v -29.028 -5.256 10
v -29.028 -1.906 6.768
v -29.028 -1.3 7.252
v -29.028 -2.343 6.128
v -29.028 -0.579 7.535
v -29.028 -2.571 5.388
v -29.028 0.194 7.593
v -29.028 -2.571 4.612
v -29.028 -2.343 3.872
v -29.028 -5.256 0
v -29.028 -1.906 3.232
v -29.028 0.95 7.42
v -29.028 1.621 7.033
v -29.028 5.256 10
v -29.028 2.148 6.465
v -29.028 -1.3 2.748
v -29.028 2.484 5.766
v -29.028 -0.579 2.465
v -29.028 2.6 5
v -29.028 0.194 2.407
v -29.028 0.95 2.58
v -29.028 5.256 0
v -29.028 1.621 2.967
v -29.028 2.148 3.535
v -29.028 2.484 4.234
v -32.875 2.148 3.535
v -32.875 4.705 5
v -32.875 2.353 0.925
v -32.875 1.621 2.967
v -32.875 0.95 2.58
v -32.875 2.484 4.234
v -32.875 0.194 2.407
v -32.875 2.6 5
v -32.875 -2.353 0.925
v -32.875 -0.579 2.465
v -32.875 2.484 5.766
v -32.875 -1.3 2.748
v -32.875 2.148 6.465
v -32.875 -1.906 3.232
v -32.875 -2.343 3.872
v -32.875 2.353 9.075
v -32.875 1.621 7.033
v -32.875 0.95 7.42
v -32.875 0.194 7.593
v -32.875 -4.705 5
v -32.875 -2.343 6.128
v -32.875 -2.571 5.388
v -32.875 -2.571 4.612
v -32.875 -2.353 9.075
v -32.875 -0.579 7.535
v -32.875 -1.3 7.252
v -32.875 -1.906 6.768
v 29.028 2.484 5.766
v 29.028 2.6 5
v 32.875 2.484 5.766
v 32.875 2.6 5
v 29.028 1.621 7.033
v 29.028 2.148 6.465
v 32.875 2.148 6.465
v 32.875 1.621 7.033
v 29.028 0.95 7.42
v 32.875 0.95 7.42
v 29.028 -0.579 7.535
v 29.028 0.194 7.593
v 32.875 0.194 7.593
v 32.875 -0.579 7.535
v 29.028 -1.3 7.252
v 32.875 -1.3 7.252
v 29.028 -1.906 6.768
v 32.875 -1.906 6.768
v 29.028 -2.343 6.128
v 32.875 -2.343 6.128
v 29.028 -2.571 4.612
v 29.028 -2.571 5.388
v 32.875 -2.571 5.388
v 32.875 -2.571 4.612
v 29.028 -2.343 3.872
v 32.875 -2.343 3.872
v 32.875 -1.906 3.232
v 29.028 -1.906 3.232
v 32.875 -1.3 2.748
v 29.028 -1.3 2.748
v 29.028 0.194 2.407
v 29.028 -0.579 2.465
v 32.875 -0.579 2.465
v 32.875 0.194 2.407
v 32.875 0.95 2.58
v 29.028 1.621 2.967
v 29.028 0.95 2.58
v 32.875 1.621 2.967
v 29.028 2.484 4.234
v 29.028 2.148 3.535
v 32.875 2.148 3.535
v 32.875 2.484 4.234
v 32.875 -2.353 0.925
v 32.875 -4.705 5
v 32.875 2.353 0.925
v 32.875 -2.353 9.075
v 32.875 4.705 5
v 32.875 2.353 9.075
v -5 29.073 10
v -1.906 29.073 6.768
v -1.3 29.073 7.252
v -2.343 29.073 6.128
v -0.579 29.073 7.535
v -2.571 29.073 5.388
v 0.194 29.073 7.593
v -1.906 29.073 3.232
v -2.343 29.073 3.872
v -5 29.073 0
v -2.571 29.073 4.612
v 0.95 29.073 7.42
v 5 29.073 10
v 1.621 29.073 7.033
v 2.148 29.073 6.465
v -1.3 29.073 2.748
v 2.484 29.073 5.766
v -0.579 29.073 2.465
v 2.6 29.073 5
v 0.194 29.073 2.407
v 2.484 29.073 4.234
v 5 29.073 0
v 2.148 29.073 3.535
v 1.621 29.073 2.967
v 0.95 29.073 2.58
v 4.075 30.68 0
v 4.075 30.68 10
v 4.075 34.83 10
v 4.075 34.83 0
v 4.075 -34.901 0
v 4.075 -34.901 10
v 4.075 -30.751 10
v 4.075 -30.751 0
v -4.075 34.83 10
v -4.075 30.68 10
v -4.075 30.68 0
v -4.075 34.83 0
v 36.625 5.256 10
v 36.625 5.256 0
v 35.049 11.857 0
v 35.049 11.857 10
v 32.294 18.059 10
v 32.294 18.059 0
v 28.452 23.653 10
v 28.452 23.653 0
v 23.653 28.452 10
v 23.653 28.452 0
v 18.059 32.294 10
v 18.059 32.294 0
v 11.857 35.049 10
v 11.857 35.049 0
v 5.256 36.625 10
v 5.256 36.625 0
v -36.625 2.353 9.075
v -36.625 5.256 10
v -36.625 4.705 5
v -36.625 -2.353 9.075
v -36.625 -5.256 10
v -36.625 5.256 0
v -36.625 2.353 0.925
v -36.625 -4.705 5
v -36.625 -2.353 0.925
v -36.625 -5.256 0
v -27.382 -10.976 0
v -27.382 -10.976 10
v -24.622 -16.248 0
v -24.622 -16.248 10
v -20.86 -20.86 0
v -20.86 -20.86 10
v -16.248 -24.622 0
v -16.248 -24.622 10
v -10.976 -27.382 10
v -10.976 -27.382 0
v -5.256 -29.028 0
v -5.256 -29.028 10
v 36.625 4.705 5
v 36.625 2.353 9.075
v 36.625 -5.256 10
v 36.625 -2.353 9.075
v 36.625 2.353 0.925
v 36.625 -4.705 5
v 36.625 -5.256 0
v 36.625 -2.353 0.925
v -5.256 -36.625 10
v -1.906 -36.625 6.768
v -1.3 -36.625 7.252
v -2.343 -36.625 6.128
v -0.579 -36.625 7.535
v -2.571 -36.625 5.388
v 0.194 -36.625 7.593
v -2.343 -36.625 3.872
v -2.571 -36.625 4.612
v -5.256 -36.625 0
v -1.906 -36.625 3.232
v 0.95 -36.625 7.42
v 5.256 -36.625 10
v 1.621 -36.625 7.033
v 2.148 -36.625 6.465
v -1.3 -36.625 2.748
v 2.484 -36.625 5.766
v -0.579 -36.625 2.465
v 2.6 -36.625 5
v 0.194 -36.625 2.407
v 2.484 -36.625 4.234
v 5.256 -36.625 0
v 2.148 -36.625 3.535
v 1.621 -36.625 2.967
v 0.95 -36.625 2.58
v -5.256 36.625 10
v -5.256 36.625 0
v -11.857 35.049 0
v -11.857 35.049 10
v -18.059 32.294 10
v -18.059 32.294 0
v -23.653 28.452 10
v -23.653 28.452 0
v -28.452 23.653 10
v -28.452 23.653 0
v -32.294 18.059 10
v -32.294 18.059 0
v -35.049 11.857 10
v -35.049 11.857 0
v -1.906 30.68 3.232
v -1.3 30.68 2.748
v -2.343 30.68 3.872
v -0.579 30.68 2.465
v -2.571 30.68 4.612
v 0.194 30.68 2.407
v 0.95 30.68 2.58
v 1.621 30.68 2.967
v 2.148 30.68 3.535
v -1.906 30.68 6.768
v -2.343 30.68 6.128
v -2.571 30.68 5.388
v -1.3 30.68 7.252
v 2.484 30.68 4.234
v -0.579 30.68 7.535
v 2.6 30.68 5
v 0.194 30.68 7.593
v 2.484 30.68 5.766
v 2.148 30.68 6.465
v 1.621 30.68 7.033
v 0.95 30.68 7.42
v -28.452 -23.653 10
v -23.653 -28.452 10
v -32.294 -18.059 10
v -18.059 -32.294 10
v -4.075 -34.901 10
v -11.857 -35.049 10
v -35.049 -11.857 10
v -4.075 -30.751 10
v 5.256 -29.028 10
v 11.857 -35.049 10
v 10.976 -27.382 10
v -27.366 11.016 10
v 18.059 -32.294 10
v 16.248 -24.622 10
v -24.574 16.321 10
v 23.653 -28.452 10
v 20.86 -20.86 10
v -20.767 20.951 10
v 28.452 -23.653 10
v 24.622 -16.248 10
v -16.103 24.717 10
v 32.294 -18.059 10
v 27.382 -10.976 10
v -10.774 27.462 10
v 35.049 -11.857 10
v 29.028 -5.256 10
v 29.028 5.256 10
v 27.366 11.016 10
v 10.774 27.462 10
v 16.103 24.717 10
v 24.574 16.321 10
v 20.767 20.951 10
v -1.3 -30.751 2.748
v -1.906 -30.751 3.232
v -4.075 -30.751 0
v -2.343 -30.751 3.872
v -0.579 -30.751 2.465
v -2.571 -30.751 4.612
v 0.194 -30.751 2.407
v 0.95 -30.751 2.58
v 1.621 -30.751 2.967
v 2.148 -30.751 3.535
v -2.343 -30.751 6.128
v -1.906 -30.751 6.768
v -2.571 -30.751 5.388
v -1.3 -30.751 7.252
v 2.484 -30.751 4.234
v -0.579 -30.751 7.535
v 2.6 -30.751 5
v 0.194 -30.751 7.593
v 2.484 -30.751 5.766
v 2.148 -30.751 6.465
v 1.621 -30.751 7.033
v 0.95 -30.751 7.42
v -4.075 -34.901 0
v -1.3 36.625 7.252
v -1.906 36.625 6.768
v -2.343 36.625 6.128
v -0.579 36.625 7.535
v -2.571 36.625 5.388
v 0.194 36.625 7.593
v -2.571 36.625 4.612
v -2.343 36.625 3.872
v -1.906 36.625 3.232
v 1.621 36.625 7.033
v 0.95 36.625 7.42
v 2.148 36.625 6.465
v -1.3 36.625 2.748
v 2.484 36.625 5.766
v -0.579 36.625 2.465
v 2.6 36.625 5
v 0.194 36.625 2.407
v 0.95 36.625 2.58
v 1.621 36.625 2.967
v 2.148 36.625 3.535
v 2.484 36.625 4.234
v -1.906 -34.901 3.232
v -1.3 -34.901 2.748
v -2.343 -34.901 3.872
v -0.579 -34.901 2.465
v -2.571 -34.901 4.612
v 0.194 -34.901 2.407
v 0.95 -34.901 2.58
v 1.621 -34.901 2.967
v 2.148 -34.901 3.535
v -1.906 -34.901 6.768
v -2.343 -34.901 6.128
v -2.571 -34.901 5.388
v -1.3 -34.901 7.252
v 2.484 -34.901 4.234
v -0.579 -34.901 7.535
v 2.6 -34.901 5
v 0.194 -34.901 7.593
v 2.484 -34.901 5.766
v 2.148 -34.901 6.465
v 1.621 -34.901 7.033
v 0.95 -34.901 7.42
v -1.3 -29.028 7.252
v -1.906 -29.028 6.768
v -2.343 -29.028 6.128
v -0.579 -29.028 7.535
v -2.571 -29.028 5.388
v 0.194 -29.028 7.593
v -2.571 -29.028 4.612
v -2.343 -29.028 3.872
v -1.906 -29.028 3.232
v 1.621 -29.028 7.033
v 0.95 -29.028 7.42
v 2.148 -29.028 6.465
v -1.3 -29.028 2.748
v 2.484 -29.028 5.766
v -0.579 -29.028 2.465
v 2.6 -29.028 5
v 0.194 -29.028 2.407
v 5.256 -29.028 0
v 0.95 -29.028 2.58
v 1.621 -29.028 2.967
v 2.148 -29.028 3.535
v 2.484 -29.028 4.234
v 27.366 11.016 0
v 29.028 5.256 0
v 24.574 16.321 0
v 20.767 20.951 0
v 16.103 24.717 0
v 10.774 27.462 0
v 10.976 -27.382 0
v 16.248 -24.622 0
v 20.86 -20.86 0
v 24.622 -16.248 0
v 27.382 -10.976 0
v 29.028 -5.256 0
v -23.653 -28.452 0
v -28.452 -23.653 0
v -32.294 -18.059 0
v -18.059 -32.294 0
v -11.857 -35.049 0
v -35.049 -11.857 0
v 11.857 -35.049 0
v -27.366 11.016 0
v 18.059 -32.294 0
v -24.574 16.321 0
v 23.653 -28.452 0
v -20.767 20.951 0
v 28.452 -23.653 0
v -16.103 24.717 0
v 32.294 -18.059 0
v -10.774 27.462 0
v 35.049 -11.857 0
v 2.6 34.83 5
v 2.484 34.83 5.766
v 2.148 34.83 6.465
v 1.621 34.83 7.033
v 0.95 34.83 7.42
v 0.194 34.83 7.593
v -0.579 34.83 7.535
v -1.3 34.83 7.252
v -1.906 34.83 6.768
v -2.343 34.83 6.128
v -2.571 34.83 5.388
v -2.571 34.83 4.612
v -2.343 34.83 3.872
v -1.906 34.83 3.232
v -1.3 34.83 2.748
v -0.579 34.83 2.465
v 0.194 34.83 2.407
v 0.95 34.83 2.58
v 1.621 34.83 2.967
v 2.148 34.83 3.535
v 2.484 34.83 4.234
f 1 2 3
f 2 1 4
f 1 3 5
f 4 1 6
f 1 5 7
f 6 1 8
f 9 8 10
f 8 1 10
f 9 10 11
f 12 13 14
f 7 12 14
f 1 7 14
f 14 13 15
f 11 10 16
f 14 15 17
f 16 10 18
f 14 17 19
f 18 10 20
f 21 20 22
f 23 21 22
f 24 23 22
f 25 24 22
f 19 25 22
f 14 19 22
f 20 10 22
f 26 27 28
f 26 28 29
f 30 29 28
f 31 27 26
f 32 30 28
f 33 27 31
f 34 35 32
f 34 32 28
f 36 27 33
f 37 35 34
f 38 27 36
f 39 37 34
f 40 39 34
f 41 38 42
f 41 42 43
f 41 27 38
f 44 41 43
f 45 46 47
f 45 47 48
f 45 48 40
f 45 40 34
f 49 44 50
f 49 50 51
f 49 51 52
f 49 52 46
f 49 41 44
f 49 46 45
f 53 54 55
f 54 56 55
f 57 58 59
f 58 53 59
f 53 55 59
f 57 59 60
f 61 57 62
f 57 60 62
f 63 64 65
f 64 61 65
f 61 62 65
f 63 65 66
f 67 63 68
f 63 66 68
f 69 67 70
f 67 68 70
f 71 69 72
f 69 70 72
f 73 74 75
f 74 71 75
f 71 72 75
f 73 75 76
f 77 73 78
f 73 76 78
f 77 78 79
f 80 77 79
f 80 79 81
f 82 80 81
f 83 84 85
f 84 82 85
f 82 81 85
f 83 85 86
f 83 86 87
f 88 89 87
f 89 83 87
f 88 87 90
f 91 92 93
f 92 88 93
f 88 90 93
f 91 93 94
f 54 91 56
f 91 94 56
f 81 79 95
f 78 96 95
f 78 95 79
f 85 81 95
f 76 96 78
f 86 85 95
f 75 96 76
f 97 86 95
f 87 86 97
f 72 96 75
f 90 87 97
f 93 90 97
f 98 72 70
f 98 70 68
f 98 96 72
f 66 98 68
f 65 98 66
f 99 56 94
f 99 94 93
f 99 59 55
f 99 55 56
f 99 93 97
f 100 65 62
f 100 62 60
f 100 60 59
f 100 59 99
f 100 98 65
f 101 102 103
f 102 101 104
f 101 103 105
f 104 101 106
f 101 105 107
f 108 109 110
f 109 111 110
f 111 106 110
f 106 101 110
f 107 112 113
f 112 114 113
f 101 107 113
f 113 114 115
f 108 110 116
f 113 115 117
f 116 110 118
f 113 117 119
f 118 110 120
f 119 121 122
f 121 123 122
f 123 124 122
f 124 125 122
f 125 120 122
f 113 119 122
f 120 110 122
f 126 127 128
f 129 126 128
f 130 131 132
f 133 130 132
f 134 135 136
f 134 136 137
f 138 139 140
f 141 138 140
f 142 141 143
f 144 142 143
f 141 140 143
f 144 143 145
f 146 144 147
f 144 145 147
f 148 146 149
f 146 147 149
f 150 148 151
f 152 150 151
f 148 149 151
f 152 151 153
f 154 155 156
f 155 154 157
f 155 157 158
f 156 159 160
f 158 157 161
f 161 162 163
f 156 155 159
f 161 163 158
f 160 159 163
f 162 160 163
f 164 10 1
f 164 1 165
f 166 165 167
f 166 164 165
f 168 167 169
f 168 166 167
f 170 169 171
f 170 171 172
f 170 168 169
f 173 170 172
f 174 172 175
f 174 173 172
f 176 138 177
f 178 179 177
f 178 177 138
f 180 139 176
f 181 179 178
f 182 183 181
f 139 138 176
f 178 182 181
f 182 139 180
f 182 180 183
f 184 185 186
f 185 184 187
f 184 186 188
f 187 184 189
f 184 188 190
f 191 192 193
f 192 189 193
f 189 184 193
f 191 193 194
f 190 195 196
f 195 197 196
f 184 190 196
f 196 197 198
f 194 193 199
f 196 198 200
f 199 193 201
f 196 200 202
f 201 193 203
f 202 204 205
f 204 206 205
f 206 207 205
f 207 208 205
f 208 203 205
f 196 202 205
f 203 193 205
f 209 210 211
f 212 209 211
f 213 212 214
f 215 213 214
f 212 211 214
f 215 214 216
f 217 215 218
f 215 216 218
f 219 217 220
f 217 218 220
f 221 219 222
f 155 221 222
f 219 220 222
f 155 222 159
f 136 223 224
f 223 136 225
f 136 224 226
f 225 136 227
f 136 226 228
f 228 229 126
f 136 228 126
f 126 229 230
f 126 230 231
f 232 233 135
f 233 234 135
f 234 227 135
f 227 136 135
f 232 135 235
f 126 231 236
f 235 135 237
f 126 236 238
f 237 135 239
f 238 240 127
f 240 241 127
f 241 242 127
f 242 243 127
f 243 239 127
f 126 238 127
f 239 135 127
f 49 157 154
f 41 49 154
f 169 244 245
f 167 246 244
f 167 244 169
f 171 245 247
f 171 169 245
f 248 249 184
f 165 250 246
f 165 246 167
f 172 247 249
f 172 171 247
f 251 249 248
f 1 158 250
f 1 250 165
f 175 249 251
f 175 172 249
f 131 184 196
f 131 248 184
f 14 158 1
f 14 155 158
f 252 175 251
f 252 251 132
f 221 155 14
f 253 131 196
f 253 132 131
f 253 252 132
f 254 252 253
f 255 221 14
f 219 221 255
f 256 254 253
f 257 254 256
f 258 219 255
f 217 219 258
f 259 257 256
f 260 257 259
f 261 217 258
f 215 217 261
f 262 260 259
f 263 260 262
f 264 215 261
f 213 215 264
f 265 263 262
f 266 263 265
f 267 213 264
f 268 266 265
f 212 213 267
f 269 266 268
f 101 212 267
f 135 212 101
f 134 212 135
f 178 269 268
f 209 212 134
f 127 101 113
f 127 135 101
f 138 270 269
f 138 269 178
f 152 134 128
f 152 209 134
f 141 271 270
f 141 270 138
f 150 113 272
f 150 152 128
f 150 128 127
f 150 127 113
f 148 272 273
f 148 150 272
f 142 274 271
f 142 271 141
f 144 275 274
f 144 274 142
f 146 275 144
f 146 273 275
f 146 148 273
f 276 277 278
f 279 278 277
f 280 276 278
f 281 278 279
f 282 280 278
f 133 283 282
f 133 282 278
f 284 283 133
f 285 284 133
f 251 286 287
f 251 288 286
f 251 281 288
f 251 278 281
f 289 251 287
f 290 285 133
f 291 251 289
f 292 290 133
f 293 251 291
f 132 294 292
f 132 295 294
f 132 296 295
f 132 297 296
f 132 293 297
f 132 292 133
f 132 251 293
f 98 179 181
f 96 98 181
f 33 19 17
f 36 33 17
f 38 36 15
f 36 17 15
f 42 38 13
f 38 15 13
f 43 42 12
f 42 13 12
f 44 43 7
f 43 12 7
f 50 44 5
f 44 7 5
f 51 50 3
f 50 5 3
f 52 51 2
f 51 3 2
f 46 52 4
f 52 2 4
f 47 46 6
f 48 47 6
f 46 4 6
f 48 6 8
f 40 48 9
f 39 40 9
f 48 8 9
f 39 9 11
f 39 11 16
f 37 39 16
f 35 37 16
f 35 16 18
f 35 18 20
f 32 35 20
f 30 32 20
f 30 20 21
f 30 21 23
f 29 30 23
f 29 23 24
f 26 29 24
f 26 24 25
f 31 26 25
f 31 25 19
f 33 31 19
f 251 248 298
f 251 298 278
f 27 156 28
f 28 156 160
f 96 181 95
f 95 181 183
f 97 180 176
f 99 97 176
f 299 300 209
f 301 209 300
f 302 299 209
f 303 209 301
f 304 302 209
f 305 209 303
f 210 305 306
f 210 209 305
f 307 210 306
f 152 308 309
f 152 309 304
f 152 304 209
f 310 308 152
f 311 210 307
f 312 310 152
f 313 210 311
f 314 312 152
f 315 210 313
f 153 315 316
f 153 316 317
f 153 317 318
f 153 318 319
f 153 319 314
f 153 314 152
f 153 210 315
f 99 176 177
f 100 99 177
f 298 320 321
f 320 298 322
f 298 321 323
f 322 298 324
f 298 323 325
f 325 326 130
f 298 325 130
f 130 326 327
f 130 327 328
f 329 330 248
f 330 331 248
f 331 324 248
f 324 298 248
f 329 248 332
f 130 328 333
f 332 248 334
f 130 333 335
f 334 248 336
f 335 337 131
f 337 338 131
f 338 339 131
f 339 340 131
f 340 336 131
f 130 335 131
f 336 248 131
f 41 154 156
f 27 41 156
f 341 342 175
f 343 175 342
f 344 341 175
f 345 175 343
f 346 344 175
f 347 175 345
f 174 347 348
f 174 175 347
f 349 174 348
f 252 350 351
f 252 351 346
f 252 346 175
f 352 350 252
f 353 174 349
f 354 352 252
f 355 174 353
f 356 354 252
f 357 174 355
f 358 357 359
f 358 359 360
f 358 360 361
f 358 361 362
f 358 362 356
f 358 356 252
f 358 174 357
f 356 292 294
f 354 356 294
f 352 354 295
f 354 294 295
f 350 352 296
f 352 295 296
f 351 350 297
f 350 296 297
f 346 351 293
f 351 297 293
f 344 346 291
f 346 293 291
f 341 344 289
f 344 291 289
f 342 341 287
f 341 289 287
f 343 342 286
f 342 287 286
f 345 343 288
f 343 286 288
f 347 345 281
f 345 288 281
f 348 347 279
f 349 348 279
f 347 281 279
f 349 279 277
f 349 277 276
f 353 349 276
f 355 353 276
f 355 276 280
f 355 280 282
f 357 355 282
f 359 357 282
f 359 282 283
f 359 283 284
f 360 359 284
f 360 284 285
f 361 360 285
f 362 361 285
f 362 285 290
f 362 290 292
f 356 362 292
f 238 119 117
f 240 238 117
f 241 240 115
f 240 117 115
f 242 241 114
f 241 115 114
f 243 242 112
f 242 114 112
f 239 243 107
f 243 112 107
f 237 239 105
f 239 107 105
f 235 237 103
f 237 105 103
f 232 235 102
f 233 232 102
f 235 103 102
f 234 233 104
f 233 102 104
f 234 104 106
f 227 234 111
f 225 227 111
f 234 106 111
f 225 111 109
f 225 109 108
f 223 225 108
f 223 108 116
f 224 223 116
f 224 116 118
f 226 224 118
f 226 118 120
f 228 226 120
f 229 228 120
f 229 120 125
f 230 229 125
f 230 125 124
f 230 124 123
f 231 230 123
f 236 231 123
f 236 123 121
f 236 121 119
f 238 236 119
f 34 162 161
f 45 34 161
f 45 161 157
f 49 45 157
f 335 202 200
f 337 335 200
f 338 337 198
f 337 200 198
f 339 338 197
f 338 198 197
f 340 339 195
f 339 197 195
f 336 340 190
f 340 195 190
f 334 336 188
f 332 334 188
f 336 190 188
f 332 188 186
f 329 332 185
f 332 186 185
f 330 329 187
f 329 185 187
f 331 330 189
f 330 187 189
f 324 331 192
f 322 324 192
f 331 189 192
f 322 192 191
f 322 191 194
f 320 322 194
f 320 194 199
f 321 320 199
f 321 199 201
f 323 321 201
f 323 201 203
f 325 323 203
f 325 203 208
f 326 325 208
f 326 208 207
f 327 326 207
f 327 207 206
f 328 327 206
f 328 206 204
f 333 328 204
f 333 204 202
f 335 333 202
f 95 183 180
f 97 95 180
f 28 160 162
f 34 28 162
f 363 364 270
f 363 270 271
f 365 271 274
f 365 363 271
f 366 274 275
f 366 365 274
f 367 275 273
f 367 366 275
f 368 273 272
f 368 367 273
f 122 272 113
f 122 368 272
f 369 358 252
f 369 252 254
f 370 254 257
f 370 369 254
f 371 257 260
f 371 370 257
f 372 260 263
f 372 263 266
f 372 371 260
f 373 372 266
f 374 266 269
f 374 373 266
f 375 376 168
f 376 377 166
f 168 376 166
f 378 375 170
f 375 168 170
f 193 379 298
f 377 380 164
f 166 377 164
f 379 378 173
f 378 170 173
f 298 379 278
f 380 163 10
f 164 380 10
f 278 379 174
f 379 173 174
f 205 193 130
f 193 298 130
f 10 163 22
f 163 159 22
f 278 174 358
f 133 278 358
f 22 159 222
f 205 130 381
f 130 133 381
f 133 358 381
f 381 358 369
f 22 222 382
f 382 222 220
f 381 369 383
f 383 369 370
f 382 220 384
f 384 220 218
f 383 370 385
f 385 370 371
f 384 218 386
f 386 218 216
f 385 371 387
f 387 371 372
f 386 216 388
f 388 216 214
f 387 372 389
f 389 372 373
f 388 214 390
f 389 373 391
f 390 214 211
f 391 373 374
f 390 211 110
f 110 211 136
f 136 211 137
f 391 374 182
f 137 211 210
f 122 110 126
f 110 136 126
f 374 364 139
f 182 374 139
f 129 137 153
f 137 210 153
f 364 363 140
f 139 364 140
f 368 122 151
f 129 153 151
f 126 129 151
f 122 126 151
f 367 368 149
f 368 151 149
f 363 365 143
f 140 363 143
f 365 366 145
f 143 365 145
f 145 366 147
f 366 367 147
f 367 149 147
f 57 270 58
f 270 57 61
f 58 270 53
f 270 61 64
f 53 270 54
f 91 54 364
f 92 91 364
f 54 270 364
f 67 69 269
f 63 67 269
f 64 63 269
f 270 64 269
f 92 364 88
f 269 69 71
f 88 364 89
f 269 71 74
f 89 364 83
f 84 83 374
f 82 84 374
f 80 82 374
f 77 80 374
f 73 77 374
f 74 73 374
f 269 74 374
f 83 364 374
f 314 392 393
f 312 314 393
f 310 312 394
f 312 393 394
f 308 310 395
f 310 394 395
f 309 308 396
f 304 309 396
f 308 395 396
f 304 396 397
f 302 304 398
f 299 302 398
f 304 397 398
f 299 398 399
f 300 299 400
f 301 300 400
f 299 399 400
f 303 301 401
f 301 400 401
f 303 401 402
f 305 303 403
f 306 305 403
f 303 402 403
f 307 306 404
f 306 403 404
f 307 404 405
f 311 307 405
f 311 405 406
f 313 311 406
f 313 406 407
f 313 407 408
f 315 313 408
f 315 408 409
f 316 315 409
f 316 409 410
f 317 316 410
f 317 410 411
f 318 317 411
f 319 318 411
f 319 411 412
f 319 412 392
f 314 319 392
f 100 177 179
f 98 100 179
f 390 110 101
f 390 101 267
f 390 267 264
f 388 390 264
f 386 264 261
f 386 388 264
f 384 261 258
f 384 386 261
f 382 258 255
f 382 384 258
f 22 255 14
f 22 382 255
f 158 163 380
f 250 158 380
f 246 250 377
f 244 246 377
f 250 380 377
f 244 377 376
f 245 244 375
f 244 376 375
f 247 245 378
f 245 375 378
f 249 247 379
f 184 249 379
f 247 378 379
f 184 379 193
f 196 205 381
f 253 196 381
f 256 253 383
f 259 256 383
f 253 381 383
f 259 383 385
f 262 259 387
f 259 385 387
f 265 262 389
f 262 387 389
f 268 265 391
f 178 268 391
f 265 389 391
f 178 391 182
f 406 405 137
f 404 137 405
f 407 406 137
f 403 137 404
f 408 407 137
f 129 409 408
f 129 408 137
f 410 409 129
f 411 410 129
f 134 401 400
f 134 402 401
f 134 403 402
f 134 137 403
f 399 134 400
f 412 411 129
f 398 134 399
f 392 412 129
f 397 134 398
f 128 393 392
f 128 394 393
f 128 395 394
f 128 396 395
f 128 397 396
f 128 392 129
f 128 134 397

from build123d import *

# Parameters (mm, degrees)
PAD008_DEPTH          = 10
SKETCH025_R           = 2.6
POCKET015_DEPTH       = 73.249467
POCKET016_DEPTH       = 3.75
POLARPATTERN005_COUNT = 2
POLARPATTERN006_COUNT = 4
SKETCH026_W           = 8.15
SKETCH026_H           = 4.15
POCKET017_DEPTH       = 10


with BuildPart() as part:
    # Sketch023 → Pad008 (new body)
    with BuildSketch(Plane.XY):
        with BuildLine():
            Line((-36.624733, 5.256321), (-36.624733, -5.256321))
            ThreePointArc((-36.624733, -5.256321), (-26.162951, -26.162951), (-5.256321, -36.624733))
            Line((-5.256321, -36.624733), (5.256321, -36.624733))
            ThreePointArc((5.256321, -36.624733), (26.162951, -26.162951), (36.624733, -5.256321))
            Line((36.624733, 5.256321), (36.624733, -5.256321))
            ThreePointArc((36.624733, 5.256321), (26.162951, 26.162951), (5.256321, 36.624733))
            Line((-5.256321, 36.624733), (5.256321, 36.624733))
            ThreePointArc((-5.256321, 36.624733), (-26.162951, 26.162951), (-36.624733, 5.256321))
        make_face()
        with BuildLine():
            Line((-29.027936, -5.256321), (-29.027936, 5.256321))
            ThreePointArc((-5, 29.073184), (-20.767423, 20.951471), (-29.027936, 5.256321))
            Line((-5, 29.073184), (5, 29.073184))
            ThreePointArc((29.027936, 5.256321), (20.767423, 20.951471), (5, 29.073184))
            Line((29.027936, 5.256321), (29.027936, -5.256321))
            ThreePointArc((5.256321, -29.027936), (20.85965, -20.85965), (29.027936, -5.256321))
            Line((-5.256321, -29.027936), (5.256321, -29.027936))
            ThreePointArc((-29.027936, -5.256321), (-20.85965, -20.85965), (-5.256321, -29.027936))
        make_face(mode=Mode.SUBTRACT)
    extrude(amount=PAD008_DEPTH)

    # Sketch025 (on Face4 of Pad008) → Pocket015 (cut)
    with BuildSketch(Plane.XZ.offset(36.624733)):
        with Locations((0, 5)):
            Circle(SKETCH025_R)
    pocket015 = extrude(amount=-POCKET015_DEPTH, mode=Mode.SUBTRACT)

    # Sketch024 (on Face6 of Pad008) → Pocket016 (cut)
    with BuildSketch(Plane.YZ.offset(36.624733)):
        Polygon((4.705405, 5), (2.352702, 9.075), (-2.352702, 9.075), (-4.705405, 5), (-2.352702, 0.925), (2.352702, 0.925), align=None)
    pocket016 = extrude(amount=-POCKET016_DEPTH, mode=Mode.SUBTRACT)

    # PolarPattern005: Pocket016 ×2 about axis
    polarpattern005_axis = Axis((0, 0, 0), (0, 0, 1))
    for i in range(1, POLARPATTERN005_COUNT):
        add(pocket016.rotate(polarpattern005_axis, i * 360 / POLARPATTERN005_COUNT), mode=Mode.SUBTRACT)

    # PolarPattern006: Pocket015 ×4 about axis
    polarpattern006_axis = Axis((0, 0, 0), (0, 0, 1))
    for i in range(1, POLARPATTERN006_COUNT):
        add(pocket015.rotate(polarpattern006_axis, i * 360 / POLARPATTERN006_COUNT), mode=Mode.SUBTRACT)

    # Sketch026 (on Face5 of PolarPattern006) → Pocket017 (cut)
    with BuildSketch(Plane.XY.offset(10)):
        with Locations((0, -32.826335)):
            Rectangle(SKETCH026_W, SKETCH026_H)
        with Locations((0, 32.754596)):
            Rectangle(SKETCH026_W, SKETCH026_H)
    extrude(amount=-POCKET017_DEPTH, mode=Mode.SUBTRACT)


solid = part.part
